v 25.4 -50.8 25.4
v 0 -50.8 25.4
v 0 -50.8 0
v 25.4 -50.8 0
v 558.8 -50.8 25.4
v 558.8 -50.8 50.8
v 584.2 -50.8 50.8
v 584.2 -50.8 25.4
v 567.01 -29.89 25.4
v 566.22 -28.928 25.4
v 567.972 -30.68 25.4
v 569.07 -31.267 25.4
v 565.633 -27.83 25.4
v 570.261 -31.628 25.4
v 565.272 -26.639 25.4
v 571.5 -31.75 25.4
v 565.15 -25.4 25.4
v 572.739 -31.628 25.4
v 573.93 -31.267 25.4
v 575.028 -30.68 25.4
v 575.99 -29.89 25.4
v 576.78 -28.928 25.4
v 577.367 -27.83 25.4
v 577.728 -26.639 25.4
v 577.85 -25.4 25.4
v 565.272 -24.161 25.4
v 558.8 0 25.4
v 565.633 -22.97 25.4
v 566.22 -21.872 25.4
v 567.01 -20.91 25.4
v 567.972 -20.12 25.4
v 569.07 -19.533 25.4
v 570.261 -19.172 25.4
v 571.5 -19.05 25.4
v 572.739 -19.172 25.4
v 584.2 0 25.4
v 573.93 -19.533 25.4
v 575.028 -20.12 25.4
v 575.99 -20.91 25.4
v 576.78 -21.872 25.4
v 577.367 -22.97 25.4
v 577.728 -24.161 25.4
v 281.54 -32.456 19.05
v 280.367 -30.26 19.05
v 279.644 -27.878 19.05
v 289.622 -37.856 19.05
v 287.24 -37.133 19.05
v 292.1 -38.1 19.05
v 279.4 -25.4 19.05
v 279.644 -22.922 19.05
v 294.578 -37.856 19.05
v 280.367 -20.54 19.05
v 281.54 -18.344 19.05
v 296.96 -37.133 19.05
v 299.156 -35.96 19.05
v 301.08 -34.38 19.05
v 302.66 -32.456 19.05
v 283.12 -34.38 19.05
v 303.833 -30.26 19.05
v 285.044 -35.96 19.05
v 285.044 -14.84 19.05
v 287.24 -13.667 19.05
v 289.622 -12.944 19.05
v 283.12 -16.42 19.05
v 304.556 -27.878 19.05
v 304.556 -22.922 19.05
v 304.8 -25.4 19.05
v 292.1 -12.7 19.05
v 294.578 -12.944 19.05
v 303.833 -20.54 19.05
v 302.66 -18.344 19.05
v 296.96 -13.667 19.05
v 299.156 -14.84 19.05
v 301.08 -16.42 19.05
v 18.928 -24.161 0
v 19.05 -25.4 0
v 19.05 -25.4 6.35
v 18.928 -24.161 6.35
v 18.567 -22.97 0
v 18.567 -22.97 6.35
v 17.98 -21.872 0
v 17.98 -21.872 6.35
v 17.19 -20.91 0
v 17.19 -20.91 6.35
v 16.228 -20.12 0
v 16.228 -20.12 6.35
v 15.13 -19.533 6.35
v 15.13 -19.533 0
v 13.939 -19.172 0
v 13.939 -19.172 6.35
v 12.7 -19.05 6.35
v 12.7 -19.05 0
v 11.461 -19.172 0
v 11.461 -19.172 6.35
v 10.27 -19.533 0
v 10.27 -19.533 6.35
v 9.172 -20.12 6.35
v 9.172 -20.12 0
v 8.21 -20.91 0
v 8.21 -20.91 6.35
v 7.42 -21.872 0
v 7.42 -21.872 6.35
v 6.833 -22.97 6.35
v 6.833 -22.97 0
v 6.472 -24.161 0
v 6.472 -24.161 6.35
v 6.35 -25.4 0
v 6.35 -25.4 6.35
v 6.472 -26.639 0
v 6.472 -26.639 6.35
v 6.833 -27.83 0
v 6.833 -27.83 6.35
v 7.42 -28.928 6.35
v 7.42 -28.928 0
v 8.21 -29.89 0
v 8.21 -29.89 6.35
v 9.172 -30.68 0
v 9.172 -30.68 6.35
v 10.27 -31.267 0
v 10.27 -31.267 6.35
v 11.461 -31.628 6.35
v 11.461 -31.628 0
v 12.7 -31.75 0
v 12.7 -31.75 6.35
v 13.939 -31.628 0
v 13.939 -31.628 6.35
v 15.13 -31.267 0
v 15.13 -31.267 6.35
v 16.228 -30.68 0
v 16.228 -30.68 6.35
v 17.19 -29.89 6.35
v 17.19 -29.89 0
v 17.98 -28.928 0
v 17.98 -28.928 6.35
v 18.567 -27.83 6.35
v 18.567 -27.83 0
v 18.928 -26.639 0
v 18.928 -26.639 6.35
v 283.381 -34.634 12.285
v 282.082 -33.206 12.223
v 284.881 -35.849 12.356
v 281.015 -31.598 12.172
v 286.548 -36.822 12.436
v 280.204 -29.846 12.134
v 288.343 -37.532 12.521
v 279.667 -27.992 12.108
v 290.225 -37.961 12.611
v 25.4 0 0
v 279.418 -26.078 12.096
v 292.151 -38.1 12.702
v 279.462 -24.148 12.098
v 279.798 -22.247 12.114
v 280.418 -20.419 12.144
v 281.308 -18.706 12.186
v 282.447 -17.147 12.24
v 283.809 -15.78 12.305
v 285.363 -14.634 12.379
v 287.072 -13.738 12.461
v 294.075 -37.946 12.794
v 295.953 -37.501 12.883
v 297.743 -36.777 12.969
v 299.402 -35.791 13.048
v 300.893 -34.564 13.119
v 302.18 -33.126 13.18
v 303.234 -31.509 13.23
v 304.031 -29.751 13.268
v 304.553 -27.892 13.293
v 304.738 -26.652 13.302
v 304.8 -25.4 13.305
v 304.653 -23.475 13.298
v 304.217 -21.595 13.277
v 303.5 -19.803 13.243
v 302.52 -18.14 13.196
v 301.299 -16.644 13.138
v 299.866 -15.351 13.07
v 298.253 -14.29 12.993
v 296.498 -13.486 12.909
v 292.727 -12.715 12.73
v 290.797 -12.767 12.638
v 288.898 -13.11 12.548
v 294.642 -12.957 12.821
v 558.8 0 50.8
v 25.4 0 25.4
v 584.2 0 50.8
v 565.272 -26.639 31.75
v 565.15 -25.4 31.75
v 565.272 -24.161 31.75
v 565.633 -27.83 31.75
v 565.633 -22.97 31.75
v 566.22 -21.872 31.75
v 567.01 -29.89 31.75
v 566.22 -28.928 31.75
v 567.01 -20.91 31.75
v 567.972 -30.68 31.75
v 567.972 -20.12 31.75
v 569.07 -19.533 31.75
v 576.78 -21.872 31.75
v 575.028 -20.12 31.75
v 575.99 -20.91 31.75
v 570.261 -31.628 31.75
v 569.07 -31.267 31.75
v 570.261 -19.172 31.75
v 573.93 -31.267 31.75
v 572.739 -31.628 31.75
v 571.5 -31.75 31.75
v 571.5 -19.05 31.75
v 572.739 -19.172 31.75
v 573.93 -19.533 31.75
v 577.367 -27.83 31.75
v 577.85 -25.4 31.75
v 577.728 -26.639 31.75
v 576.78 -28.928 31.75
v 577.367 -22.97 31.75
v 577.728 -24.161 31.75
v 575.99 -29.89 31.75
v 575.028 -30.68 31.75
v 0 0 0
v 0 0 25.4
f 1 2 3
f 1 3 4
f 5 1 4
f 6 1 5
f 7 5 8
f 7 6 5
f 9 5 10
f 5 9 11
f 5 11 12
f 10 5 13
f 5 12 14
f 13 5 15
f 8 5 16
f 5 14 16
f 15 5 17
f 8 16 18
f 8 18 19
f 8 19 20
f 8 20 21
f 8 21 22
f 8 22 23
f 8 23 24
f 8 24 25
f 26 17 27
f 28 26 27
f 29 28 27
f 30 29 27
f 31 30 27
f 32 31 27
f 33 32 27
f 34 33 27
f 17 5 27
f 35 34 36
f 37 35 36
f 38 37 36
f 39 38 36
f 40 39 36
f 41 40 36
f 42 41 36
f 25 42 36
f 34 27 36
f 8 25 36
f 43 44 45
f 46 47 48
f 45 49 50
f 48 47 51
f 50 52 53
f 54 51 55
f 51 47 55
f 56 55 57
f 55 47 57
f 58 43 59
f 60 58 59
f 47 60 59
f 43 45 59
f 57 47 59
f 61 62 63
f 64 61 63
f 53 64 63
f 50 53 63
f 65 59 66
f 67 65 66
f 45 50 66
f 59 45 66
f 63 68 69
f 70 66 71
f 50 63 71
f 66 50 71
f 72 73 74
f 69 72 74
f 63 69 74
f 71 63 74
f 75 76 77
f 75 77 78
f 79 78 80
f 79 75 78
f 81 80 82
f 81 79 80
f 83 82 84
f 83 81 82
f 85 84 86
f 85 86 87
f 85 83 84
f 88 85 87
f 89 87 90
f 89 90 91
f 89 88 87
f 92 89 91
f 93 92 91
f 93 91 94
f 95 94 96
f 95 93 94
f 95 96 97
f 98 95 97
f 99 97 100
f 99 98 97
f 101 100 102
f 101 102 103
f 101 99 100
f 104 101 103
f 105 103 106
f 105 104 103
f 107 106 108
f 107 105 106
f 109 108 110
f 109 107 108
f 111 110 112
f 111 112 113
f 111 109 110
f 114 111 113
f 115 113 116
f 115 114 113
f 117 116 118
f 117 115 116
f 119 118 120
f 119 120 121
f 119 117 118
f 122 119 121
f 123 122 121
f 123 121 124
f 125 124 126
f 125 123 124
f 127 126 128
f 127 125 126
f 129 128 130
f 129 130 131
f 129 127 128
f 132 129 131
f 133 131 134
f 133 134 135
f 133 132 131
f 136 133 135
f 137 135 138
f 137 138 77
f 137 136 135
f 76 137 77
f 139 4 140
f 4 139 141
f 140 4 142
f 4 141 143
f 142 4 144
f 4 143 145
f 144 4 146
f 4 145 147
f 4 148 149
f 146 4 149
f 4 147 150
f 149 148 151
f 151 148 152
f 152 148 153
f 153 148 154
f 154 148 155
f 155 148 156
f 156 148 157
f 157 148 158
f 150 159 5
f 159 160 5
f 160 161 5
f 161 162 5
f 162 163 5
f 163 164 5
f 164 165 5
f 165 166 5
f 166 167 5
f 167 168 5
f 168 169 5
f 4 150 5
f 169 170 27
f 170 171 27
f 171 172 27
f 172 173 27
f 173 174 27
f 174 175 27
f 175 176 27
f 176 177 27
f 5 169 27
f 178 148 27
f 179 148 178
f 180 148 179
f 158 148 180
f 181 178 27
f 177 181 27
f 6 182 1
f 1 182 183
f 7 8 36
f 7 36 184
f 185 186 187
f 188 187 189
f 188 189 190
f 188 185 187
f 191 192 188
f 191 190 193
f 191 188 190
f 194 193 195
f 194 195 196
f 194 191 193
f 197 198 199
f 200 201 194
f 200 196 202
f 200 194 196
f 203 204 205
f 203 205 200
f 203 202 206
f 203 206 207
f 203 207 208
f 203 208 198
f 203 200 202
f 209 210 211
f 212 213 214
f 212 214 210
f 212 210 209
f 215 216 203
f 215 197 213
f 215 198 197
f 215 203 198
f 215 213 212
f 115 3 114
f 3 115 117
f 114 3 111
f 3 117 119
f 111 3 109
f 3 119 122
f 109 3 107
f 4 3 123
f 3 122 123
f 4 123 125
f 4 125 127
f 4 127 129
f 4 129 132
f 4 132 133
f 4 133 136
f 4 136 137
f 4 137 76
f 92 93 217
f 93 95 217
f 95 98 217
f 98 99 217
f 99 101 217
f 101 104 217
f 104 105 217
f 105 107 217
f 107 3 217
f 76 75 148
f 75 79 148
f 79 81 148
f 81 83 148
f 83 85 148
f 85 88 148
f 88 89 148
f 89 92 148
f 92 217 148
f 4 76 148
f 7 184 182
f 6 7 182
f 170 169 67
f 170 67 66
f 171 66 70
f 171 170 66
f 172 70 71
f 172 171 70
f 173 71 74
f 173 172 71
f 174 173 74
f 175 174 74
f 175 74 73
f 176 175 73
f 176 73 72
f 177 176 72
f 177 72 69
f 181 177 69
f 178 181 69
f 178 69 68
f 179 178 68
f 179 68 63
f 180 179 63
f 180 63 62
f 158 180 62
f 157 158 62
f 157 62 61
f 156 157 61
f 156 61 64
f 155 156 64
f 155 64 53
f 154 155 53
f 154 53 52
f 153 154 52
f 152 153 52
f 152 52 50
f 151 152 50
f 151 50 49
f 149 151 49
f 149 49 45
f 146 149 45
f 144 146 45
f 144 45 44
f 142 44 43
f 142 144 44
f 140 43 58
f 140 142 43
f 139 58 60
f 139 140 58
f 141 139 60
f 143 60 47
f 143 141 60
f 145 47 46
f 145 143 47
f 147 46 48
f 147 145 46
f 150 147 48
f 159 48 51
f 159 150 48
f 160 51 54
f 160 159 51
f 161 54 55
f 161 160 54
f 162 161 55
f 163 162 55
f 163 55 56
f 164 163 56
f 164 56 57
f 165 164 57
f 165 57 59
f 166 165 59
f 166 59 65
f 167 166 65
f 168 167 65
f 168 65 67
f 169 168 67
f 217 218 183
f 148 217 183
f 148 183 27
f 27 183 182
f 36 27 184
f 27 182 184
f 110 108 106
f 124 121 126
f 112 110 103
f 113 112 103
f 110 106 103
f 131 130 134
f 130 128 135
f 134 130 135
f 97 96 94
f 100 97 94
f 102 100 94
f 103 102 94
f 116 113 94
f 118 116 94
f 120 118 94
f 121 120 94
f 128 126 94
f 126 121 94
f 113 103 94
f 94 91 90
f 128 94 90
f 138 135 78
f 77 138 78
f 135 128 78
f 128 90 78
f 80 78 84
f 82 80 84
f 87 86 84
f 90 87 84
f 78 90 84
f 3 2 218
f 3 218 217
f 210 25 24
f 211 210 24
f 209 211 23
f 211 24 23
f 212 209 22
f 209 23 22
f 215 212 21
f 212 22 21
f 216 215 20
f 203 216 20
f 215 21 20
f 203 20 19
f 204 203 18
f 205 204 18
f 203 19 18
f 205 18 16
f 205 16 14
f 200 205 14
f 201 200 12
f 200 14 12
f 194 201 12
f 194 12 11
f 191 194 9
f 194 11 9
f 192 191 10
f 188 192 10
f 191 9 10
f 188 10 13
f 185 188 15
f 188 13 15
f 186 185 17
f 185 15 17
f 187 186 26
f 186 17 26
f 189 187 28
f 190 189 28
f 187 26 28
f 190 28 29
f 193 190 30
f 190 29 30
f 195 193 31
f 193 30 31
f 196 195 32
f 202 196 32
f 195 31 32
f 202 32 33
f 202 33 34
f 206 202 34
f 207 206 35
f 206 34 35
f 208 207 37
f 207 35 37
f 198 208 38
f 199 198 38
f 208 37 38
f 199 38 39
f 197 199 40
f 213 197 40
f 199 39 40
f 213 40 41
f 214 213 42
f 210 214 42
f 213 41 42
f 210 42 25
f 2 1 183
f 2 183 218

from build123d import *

# Parameters (mm, degrees)
F1_DEPTH = 50.8
F2_R     = 6.35
F3_DEPTH = 6.35
F4_R     = 12.7
F5_DEPTH = 19.05
F6_R     = 6.35
F7_DEPTH = 6.35


with BuildPart() as f1:
    # F0 (on Front) → F1 (new body)
    with BuildSketch(Plane.XZ):
        Polygon((0, 25.4), (0, 0), (25.4, 0), (558.8, 25.4), (584.2, 25.4), (584.2, 50.8), (558.8, 50.8), (25.4, 25.4), align=None)
    extrude(amount=F1_DEPTH)

    # F2 (on Top) → F3 (cut)
    with BuildSketch(Plane.XY):
        with Locations((12.7, -25.4)):
            Circle(F2_R)
    extrude(amount=F3_DEPTH, mode=Mode.SUBTRACT)

    # F4 (on Top) → F5 (cut)
    with BuildSketch(Plane.XY):
        with Locations((292.1, -25.4)):
            Circle(F4_R)
    extrude(amount=F5_DEPTH, mode=Mode.SUBTRACT)

    # F6 (on face) → F7 (cut)
    with BuildSketch(Plane(origin=(0, 0, 25.4), x_dir=(1, 0, 0), z_dir=(0, 0, -1))):
        with Locations((571.5, 25.4)):
            Circle(F6_R)
    extrude(amount=-F7_DEPTH, mode=Mode.SUBTRACT)


solid = f1.part
